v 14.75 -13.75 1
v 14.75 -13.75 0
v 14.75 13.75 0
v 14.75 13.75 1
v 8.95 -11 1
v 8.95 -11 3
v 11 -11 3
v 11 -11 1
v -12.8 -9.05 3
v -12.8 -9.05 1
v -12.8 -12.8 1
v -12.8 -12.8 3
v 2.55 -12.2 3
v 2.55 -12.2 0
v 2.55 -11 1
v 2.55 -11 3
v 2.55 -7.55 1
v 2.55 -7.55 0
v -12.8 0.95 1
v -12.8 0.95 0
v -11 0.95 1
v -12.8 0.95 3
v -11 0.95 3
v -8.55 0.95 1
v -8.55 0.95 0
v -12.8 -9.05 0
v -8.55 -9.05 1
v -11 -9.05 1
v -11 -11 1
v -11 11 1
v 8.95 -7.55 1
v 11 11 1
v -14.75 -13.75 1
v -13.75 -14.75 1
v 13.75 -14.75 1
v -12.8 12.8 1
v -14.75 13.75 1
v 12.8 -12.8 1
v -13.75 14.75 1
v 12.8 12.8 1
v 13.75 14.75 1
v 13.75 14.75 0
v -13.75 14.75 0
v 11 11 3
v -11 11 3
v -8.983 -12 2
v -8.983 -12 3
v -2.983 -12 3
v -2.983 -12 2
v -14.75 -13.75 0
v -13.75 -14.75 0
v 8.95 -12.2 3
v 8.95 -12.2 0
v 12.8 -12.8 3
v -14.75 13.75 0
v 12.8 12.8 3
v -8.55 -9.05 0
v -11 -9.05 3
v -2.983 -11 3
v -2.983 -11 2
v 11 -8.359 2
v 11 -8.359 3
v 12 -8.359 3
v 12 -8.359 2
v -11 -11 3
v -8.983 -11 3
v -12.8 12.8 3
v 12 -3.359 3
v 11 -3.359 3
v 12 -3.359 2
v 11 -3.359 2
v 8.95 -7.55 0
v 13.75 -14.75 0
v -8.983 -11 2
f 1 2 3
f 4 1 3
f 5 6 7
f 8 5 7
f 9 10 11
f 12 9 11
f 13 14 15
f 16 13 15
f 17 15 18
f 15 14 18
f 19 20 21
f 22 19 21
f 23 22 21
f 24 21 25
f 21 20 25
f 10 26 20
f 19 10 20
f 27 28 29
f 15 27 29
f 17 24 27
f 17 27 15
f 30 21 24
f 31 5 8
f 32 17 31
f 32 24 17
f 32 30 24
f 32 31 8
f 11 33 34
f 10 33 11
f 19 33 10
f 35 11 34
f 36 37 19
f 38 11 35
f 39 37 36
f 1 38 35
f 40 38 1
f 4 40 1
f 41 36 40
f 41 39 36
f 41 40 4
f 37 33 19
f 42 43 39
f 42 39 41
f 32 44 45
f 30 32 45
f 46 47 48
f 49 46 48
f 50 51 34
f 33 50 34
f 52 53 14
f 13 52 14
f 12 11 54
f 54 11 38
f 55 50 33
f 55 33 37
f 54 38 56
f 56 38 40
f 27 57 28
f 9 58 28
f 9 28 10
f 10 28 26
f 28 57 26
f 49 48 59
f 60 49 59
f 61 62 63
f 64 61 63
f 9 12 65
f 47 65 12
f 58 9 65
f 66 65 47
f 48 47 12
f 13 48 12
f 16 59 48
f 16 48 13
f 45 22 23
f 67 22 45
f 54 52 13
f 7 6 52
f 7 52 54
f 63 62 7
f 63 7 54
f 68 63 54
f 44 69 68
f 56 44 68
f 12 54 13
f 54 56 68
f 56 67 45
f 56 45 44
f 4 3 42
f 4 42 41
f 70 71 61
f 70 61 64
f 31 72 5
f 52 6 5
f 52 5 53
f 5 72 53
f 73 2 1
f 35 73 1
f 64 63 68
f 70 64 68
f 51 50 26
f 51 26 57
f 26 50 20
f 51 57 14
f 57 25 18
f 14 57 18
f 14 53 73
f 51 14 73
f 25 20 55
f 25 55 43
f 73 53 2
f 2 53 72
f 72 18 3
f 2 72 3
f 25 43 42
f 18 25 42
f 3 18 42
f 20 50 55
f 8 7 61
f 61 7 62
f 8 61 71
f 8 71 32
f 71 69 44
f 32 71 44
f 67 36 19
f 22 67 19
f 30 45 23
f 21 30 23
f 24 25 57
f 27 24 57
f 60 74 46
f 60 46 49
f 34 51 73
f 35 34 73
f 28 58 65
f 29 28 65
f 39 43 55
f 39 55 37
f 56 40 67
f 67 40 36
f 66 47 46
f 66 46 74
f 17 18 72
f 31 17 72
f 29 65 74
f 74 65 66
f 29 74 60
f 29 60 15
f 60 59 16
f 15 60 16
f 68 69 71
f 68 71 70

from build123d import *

# Parameters (mm, degrees)
F1_DEPTH = 3.5
F0_W     = 29.5
F0_H     = 29.5
F2_DEPTH = 1
F3_SIZE  = 1
F5_DEPTH = 2.5
F6_W     = 1
F6_H     = 5
F6_W_2   = 6
F6_H_2   = 1
F7_DEPTH = 1.5
F8_DEPTH = 0.5


with BuildPart() as f1:
    # F0 (on Top) → F1 (new body)
    with BuildSketch(Plane.XY):
        Polygon((12.8, -12.8), (12.8, 12.8), (-12.8, 12.8), (-12.8, 0.95), (-8.65, 0.95), (-8.55, 0.95), (-8.55, -9.05), (-8.65, -9.05), (-12.8, -9.05), (-12.8, -12.8), align=None)
        Polygon((2.55, -7.55), (8.95, -7.55), (8.95, -12.2), (2.55, -12.2), (2.55, -7.642402336), align=None, mode=Mode.SUBTRACT)
    extrude(amount=F1_DEPTH)

    # F0 (on Top) → F2 (join)
    with BuildSketch(Plane.XY):
        Rectangle(F0_W, F0_H)
        Polygon((-12.8, 12.8), (12.8, 12.8), (12.8, -12.8), (-12.8, -12.8), (-12.8, -9.05), (-12.8, 0.95), align=None, mode=Mode.SUBTRACT)
    extrude(amount=F2_DEPTH)

    # F3
    f3_edges = [f1.edges().sort_by_distance(p)[0] for p in [
        (14.75, 14.75, 0.5),
        (14.75, -14.75, 0.5),
        (-14.75, -14.75, 0.5),
        (-14.75, 14.75, 0.5),
    ]]
    chamfer(f3_edges, length=F3_SIZE)

    # F4 (on face) → F5 (cut)
    with BuildSketch(Plane.XY.offset(3.5)):
        Polygon((11, -11), (11, 11), (-11, 11), (-11, 0.95), (-8.55, 0.95), (-8.55, -9.05), (-11, -9.05), (-11, -11), (2.55, -11), (2.55, -7.55), (8.95, -7.55), (8.95, -11), align=None)
    extrude(amount=-F5_DEPTH, mode=Mode.SUBTRACT)

    # F6 (on face) → F7 (cut)
    with BuildSketch(Plane.XY.offset(3.5)):
        with Locations((11.5, -5.8585465327)):
            Rectangle(F6_W, F6_H)
        with Locations((-5.983454667, -11.5)):
            Rectangle(F6_W_2, F6_H_2)
    extrude(amount=-F7_DEPTH, mode=Mode.SUBTRACT)

    # F8 (cut): a face of the model
    f8_faces = [f1.faces().sort_by_distance(p)[0] for p in [
        (-12.437961328, -10.925, 3.5),
    ]]
    extrude(f8_faces, amount=-F8_DEPTH, mode=Mode.SUBTRACT)


solid = f1.part
